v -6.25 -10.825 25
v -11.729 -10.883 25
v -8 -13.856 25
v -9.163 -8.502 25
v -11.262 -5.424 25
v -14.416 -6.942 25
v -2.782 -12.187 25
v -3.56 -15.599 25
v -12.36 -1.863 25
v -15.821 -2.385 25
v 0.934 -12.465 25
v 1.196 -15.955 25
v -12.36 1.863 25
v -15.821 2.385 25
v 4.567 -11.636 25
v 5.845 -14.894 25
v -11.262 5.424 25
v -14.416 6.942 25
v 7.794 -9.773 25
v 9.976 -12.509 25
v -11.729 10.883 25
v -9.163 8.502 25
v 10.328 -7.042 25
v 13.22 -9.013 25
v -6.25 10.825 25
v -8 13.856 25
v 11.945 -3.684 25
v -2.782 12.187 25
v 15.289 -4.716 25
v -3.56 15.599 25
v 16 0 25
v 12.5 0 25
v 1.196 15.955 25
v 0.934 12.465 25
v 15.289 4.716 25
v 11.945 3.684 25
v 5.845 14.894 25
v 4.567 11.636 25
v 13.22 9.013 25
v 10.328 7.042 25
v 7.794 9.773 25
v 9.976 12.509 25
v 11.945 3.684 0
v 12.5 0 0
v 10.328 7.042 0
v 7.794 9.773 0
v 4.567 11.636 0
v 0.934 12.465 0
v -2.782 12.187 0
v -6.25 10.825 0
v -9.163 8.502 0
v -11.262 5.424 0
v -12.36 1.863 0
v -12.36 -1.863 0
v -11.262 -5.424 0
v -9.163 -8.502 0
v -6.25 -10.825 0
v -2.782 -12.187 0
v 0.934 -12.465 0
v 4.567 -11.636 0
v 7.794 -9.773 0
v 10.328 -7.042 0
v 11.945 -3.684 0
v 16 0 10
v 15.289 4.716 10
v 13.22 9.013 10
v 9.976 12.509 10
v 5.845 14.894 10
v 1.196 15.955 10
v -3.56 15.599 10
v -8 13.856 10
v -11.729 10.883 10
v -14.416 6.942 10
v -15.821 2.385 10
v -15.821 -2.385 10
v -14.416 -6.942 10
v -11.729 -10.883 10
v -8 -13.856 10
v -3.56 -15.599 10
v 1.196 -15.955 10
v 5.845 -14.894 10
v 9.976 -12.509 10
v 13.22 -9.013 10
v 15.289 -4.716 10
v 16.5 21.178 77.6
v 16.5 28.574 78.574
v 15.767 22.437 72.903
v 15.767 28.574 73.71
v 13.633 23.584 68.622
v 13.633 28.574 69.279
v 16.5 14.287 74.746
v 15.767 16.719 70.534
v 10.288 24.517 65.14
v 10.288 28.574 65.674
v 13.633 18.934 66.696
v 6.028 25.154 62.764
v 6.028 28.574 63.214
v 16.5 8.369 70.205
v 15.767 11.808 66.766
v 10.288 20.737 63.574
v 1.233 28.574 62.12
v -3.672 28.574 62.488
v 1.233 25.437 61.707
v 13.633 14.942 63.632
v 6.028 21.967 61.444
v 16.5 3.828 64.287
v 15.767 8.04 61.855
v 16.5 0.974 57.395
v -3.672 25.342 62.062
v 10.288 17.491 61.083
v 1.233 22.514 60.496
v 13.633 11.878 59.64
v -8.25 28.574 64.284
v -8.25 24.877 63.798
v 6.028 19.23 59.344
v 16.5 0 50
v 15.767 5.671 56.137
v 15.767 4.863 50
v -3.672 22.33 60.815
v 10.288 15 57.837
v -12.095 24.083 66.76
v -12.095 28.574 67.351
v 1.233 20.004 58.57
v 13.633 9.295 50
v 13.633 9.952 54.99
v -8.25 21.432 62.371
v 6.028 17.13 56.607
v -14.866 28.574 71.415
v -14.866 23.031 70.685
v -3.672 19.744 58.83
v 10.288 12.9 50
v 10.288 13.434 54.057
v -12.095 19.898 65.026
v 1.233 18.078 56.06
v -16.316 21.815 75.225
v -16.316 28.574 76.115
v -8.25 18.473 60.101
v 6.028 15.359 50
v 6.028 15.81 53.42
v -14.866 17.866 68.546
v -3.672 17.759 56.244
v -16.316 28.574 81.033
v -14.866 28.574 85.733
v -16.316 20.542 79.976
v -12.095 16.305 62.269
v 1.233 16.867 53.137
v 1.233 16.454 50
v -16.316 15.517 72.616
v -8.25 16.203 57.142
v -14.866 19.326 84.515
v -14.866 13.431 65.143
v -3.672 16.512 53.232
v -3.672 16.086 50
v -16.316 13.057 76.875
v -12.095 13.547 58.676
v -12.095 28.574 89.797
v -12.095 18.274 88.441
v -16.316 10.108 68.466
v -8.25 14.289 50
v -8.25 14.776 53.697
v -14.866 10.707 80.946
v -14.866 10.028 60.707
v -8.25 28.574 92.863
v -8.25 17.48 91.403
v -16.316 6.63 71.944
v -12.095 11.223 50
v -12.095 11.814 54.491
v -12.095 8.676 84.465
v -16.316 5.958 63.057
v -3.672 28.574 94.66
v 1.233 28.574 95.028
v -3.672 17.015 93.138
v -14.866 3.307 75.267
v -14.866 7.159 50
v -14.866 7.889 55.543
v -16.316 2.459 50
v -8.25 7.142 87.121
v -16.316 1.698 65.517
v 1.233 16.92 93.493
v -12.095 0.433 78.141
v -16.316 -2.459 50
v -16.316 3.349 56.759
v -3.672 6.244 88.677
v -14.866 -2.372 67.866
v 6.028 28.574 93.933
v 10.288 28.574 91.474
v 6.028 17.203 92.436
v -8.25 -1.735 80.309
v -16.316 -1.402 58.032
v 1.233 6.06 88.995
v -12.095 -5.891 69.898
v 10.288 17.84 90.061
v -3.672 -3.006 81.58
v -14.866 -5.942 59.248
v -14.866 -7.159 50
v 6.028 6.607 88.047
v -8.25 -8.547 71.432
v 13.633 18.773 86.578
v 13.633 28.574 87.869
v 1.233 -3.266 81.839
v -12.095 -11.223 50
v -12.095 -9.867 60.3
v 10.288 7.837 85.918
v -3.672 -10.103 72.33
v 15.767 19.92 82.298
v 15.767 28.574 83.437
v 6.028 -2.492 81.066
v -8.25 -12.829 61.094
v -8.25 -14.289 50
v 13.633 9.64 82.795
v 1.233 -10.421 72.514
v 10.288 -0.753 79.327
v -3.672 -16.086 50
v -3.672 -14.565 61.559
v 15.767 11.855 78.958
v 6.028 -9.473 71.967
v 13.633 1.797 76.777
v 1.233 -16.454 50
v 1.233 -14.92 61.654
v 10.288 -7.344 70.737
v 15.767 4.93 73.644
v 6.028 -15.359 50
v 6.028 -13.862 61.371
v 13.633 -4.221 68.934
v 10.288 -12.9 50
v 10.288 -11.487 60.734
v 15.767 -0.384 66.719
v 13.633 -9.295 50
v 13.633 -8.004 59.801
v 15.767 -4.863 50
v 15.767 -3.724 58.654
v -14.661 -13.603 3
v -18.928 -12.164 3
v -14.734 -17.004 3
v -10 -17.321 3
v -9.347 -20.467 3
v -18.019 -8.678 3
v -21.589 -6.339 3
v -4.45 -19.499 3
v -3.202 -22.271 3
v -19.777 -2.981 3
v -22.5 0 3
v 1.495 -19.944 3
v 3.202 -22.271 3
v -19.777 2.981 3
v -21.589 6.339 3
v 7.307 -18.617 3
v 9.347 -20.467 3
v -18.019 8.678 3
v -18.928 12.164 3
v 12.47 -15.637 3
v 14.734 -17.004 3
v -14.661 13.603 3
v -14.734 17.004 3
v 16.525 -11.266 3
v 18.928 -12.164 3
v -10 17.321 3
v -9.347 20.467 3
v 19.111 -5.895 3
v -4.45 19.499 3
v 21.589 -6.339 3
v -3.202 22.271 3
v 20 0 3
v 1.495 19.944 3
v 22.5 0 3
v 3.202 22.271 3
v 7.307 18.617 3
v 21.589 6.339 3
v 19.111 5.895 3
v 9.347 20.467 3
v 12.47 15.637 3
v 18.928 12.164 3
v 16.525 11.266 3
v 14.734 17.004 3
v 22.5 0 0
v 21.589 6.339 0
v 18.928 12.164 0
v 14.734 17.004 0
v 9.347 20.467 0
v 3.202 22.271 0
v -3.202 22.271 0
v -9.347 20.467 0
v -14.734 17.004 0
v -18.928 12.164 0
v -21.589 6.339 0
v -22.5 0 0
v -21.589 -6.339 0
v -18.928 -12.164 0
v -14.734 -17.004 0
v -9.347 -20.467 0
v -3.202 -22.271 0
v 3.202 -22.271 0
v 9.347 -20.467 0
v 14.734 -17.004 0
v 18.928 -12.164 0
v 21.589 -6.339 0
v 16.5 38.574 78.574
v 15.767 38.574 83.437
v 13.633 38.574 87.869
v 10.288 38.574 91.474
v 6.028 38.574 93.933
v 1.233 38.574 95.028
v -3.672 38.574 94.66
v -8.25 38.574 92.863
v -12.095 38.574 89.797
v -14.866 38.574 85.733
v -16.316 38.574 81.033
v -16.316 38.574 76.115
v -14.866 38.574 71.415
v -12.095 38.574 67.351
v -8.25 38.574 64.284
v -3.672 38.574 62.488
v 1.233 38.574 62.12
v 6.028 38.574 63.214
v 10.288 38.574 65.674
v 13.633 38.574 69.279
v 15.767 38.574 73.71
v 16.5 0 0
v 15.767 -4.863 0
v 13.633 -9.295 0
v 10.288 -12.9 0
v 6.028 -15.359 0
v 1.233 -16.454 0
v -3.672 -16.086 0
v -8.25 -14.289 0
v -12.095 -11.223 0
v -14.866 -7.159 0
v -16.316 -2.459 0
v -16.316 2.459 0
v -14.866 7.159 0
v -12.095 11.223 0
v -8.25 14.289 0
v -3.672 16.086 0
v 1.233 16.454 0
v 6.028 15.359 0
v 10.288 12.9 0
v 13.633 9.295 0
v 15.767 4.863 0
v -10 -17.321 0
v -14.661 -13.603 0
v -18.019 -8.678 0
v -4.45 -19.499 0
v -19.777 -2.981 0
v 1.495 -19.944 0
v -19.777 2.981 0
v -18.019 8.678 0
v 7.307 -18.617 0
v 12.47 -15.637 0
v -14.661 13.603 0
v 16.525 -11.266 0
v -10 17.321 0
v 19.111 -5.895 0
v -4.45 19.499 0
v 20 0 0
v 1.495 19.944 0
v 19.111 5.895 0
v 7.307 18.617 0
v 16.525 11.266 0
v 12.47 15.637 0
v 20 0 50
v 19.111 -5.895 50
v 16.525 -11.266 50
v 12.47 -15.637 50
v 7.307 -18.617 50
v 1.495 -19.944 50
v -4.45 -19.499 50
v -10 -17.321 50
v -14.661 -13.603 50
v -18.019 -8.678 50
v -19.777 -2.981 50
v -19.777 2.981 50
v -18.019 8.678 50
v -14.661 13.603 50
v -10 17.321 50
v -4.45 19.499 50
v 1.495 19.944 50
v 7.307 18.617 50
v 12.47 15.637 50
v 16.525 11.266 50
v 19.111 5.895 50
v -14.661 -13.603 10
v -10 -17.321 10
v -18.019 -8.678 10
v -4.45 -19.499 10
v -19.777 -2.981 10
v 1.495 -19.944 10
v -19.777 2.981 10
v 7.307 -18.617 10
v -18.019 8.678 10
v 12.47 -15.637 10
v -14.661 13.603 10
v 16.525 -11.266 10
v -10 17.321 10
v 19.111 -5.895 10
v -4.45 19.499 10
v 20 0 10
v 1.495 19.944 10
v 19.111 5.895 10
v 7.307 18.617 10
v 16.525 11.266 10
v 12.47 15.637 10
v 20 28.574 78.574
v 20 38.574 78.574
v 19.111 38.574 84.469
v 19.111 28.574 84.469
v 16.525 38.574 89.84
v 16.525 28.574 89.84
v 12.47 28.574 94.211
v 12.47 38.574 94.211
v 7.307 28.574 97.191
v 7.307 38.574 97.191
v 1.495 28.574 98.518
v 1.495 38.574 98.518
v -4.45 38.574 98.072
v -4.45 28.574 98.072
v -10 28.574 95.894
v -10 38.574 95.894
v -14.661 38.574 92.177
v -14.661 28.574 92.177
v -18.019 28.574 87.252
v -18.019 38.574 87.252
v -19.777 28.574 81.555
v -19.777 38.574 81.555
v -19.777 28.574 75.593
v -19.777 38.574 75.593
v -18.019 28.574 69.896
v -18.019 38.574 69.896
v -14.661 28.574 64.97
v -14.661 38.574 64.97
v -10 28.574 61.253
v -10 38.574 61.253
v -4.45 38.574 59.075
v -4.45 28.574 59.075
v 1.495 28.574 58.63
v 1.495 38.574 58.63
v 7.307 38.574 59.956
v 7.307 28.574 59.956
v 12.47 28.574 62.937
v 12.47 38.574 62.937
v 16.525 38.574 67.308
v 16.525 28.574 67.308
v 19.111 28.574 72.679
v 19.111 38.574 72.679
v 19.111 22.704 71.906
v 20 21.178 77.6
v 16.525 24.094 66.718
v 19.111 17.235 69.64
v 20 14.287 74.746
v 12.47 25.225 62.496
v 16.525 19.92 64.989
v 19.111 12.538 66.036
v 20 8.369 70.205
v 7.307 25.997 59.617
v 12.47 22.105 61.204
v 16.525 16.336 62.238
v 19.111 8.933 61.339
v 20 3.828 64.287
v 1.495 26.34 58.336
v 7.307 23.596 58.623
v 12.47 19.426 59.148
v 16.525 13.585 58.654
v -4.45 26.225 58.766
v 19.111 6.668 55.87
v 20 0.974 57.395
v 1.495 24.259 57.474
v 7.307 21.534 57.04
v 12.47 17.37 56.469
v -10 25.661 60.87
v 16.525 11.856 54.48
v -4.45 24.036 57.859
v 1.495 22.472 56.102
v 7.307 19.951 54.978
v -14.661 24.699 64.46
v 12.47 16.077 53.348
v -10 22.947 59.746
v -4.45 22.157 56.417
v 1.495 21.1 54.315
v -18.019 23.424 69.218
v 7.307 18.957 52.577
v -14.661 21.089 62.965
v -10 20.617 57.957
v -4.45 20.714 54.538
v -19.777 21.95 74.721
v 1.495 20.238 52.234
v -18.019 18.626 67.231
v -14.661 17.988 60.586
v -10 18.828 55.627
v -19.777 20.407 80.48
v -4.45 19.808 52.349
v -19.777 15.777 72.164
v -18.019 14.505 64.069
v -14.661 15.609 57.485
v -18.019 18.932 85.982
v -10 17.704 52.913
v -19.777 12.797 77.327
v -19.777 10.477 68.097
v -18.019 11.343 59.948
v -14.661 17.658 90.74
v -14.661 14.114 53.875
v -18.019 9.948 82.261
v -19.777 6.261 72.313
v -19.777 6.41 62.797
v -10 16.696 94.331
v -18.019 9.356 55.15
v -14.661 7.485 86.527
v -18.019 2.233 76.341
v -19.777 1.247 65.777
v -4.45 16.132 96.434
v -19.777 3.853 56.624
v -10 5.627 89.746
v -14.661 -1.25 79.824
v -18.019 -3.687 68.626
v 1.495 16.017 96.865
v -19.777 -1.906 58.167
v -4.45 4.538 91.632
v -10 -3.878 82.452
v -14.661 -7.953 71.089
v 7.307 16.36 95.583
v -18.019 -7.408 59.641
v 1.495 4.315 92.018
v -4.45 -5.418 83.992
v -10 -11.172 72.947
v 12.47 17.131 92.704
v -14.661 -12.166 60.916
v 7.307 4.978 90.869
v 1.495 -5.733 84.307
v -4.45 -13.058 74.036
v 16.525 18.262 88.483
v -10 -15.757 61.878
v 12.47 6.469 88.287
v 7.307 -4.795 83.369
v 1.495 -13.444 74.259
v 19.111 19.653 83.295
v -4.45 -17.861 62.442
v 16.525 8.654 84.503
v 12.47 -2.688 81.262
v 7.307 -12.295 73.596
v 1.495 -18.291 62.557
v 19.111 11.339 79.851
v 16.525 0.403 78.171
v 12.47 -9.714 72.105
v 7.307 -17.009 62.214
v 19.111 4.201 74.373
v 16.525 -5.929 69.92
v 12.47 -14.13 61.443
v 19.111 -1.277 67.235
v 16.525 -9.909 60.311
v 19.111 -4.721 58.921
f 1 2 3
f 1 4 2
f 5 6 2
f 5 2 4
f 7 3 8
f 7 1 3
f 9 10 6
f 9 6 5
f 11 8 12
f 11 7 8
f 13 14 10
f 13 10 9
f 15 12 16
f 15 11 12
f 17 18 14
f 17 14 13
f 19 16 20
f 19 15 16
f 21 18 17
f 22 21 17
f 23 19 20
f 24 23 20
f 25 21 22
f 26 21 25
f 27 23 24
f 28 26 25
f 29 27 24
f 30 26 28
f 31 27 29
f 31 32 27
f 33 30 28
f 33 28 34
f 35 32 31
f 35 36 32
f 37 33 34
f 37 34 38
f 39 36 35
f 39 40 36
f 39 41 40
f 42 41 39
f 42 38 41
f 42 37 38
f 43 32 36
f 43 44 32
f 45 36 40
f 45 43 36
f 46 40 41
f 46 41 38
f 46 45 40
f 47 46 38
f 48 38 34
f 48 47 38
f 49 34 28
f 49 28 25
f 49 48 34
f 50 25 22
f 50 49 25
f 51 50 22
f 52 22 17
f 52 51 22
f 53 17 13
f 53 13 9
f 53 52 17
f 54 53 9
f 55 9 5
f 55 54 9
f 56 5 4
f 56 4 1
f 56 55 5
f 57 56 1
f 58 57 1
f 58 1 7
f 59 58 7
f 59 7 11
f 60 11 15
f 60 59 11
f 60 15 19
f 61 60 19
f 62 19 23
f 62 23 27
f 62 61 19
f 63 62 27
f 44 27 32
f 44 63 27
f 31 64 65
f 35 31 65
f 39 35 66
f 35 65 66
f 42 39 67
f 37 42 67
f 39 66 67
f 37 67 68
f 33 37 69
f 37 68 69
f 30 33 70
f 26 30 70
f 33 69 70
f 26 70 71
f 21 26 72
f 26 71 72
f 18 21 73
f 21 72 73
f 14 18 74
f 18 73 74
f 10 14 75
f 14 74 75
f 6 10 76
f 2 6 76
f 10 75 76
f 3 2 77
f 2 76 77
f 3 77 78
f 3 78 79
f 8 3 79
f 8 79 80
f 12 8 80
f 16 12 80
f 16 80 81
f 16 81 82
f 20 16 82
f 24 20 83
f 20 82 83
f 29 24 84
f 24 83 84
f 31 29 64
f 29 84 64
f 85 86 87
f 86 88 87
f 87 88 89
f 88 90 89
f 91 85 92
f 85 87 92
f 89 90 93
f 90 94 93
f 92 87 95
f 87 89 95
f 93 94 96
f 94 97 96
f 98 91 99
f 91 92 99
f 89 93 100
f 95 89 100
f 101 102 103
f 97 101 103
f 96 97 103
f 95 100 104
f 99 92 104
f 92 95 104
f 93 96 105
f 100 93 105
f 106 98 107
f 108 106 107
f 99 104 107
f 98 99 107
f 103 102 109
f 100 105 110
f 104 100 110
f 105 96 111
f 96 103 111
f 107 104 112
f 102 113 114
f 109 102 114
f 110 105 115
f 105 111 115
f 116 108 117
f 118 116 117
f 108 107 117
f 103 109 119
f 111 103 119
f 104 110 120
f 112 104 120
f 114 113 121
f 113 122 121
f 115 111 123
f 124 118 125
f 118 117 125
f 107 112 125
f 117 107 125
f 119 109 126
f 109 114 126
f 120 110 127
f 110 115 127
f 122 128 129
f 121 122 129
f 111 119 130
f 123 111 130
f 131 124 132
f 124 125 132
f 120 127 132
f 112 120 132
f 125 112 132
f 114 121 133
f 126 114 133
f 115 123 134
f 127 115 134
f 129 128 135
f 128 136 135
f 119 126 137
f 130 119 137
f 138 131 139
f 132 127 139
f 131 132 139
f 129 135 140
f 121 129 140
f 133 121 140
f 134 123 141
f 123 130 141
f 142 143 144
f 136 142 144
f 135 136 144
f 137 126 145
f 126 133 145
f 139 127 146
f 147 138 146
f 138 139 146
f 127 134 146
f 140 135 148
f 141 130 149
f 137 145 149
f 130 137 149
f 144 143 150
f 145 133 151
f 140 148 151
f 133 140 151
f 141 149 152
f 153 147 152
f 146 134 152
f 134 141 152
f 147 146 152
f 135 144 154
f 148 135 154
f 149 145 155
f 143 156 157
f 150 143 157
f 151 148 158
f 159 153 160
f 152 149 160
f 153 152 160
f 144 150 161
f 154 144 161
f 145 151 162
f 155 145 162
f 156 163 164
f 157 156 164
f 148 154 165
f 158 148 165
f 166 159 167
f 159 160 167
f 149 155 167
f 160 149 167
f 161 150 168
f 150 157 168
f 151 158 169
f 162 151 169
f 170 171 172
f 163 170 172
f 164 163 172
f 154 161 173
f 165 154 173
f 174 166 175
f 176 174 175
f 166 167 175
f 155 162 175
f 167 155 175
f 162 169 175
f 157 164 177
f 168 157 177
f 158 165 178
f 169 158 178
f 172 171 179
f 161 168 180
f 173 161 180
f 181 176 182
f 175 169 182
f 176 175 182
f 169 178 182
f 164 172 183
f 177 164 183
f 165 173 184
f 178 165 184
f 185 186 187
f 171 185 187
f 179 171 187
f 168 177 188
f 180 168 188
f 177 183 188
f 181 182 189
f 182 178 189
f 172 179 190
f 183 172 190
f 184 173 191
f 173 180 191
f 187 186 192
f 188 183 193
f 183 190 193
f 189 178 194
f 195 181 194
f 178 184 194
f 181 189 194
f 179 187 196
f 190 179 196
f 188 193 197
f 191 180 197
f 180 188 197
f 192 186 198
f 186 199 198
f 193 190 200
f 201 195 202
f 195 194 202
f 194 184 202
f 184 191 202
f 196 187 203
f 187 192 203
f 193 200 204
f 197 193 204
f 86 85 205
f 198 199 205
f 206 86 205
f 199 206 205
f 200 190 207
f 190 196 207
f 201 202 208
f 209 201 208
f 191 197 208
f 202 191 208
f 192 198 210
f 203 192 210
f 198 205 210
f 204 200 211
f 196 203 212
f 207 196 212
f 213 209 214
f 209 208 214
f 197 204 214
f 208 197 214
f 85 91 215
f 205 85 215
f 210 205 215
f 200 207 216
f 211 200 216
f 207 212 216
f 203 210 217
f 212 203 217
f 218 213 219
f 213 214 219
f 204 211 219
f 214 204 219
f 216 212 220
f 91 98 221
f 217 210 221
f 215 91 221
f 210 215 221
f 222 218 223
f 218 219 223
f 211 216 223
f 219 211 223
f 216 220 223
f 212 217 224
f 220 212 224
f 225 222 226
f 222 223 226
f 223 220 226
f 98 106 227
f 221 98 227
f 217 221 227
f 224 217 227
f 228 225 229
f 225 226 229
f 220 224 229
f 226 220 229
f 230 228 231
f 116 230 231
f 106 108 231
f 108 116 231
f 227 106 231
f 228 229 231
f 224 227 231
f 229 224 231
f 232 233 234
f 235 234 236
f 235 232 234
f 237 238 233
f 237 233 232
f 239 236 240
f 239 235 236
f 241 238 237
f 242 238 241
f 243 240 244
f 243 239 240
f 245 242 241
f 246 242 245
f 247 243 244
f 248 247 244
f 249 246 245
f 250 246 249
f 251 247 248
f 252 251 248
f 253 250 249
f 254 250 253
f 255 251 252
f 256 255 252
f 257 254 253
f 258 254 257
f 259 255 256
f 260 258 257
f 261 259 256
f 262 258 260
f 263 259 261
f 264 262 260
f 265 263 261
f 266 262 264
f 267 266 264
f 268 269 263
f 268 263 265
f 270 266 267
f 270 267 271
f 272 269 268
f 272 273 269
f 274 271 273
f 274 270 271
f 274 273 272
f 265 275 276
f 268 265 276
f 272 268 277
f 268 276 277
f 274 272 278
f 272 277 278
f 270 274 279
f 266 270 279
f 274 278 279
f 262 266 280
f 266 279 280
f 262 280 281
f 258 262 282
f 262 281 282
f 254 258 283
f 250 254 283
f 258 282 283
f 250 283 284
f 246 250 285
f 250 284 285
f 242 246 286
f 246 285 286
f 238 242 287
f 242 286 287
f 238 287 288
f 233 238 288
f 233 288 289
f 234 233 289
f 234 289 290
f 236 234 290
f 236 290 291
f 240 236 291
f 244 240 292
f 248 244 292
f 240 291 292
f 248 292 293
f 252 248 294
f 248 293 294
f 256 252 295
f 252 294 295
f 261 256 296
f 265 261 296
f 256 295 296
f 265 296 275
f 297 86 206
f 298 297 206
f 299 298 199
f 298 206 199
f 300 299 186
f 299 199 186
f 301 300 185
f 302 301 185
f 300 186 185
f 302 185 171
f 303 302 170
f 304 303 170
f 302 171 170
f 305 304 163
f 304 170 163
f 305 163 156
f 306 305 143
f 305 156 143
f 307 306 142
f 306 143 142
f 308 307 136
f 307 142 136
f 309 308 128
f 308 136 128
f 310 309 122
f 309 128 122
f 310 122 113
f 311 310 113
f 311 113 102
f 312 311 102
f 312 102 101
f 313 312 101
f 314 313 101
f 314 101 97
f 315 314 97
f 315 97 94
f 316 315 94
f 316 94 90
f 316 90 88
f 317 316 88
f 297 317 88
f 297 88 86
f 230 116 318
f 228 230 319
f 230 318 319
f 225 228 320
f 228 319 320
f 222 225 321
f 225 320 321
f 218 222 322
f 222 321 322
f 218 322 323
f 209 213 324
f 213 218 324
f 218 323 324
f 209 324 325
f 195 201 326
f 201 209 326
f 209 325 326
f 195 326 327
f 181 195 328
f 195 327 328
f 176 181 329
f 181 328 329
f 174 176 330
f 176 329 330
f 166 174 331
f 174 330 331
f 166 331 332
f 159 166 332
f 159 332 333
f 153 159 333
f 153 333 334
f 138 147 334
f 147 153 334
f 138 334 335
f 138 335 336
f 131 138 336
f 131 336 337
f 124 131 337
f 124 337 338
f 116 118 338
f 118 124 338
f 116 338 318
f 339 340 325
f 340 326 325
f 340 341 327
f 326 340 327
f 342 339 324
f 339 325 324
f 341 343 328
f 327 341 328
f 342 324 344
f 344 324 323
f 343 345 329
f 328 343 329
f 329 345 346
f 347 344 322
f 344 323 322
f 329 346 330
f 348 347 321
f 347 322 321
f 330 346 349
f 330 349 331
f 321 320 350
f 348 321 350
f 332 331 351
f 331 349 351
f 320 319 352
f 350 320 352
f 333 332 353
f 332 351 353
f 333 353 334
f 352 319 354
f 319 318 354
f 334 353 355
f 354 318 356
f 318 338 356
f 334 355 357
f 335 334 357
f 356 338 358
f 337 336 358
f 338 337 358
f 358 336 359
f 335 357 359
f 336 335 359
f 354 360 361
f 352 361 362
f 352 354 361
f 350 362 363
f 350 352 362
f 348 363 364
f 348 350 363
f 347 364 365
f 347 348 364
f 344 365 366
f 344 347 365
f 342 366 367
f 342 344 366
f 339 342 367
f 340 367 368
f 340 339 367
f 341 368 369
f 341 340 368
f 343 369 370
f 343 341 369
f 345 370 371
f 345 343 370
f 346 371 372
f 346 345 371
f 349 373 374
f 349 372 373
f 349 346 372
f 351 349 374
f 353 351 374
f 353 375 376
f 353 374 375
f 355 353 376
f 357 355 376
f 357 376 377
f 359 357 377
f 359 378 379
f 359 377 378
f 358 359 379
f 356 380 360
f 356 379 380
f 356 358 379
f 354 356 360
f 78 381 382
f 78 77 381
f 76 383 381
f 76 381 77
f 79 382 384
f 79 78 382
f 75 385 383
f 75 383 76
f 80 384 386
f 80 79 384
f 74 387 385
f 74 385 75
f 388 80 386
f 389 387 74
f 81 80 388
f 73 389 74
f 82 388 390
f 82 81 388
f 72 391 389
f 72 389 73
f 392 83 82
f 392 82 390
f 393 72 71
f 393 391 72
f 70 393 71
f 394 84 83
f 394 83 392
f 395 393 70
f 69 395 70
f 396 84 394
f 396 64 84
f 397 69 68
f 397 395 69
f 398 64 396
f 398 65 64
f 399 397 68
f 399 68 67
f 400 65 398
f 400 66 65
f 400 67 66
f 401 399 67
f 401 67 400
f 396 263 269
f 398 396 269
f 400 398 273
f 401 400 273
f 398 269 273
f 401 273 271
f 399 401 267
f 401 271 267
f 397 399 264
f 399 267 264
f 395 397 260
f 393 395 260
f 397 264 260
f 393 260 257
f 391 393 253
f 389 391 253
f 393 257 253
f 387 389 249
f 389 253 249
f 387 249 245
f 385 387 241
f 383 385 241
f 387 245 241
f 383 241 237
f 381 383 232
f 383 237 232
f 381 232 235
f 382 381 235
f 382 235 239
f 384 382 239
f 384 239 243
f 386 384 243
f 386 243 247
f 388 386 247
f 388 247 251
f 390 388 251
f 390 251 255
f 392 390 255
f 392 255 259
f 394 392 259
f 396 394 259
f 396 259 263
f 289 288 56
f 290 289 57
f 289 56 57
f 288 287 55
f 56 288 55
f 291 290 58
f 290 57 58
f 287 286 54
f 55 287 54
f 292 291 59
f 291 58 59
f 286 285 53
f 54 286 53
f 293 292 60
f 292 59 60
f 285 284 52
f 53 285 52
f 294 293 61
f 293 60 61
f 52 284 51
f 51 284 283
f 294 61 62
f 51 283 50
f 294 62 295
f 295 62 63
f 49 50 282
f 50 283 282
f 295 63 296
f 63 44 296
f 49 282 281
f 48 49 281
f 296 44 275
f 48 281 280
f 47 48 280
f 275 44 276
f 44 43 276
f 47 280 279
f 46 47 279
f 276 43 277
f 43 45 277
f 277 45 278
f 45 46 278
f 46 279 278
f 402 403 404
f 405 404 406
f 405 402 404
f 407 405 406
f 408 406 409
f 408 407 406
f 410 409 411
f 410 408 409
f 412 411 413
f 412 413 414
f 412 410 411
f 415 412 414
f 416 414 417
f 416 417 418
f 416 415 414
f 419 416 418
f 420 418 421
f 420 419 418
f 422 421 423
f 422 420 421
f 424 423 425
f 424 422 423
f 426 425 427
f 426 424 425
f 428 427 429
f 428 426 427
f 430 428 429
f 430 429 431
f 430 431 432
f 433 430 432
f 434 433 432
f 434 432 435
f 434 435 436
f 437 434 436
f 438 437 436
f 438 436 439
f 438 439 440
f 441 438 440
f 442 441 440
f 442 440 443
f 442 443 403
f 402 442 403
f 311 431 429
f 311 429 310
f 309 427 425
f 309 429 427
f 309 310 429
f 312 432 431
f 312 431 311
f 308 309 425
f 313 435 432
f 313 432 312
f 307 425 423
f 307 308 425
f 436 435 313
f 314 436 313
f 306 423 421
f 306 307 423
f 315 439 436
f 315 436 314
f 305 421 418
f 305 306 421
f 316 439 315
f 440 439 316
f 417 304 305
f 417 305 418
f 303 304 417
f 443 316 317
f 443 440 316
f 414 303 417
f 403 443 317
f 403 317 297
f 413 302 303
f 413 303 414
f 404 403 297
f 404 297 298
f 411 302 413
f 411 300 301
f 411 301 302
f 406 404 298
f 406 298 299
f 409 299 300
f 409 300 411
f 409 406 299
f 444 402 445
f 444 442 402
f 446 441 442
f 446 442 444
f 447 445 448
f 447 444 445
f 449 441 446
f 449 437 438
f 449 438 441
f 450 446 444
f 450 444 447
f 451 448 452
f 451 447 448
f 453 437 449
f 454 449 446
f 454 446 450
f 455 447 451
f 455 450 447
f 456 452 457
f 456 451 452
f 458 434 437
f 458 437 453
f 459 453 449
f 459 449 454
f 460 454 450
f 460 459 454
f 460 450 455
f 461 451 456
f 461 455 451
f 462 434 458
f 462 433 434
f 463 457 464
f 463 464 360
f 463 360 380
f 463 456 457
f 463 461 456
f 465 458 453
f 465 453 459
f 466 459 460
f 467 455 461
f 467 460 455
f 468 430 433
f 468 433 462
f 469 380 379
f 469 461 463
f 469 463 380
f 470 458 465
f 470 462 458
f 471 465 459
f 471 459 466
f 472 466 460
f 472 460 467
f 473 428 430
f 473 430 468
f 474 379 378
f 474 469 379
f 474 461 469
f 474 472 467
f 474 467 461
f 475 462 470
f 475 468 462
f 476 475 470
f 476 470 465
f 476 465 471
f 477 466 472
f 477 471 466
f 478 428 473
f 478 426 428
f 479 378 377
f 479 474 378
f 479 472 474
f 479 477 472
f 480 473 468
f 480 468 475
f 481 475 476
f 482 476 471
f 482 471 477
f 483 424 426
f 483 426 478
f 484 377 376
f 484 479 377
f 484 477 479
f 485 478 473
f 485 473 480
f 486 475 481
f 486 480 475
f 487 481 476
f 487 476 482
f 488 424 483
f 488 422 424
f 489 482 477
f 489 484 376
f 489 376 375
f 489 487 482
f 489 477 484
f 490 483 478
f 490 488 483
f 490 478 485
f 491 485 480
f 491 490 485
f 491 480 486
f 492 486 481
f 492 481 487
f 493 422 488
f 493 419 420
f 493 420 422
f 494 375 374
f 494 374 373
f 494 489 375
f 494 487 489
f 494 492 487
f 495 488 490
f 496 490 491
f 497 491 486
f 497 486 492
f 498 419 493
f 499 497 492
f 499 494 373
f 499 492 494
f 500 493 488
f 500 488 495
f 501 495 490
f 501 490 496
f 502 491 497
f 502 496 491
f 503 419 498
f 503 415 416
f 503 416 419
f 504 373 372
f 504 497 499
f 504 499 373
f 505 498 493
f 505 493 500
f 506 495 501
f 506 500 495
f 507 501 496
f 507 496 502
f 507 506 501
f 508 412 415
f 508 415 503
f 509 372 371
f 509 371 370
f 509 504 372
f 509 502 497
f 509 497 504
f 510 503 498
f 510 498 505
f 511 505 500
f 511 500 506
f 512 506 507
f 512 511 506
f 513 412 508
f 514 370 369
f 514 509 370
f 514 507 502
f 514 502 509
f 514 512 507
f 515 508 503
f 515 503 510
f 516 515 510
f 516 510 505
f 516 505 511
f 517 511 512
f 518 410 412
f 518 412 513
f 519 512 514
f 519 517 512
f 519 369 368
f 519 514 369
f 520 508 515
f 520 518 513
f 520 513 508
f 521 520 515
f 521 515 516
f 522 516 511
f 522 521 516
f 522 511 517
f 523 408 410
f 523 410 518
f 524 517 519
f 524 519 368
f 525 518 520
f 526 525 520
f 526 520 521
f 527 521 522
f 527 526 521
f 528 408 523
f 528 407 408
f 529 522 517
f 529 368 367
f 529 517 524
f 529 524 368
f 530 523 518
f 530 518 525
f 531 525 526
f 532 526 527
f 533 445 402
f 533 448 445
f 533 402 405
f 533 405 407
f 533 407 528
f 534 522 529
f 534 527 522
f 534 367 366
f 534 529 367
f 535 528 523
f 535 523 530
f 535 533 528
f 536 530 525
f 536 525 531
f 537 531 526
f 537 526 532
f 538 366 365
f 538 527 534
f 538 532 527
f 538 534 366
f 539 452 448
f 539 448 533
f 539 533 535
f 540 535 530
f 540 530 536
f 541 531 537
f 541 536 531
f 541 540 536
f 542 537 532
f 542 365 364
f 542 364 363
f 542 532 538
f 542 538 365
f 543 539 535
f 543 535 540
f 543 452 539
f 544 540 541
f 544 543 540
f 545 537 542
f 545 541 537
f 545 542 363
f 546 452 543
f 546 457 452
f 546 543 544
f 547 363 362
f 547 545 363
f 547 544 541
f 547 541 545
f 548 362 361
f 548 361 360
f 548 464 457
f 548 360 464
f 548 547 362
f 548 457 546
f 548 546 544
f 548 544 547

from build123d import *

# Parameters (mm, degrees)
F0_R     = 20
F0_R_2   = 16.5
F3_R     = 20
F3_R_2   = 12.5
F4_DEPTH = 10
F5_R     = 16
F5_R_2   = 12.5
F6_DEPTH = 15
F7_R     = 22.5
F7_R_2   = 20
F8_DEPTH = 3


with BuildPart() as f2:
    # F2: sweep along a path in F1
    with BuildLine(Plane.YZ) as f2_path:
        Line((38.5739039603, 78.5739039603), (28.5739039603, 78.5739039603))
        ThreePointArc((28.5739039603, 78.5739039603), (8.369102705, 70.2048012553), (0, 50))
        Line((0, 50), (0, 0))
    # F0 (on Top) → F2 (sweep)
    with BuildSketch(Plane.XY):
        Circle(F0_R)
        Circle(F0_R_2, mode=Mode.SUBTRACT)
    sweep(path=f2_path.line)


with BuildPart() as f4:
    # F3 (on Top) → F4 (new body)
    with BuildSketch(Plane.XY):
        Circle(F3_R)
        Circle(F3_R_2, mode=Mode.SUBTRACT)
    extrude(amount=F4_DEPTH)

    # F5 (on face) → F6 (join)
    with BuildSketch(Plane.XY.offset(10)):
        Circle(F5_R)
        Circle(F5_R_2, mode=Mode.SUBTRACT)
    extrude(amount=F6_DEPTH)

    # F7 (on Top) → F8 (join)
    with BuildSketch(Plane.XY):
        Circle(F7_R)
        Circle(F7_R_2, mode=Mode.SUBTRACT)
    extrude(amount=F8_DEPTH)


solid = Compound([f2.part, f4.part])
